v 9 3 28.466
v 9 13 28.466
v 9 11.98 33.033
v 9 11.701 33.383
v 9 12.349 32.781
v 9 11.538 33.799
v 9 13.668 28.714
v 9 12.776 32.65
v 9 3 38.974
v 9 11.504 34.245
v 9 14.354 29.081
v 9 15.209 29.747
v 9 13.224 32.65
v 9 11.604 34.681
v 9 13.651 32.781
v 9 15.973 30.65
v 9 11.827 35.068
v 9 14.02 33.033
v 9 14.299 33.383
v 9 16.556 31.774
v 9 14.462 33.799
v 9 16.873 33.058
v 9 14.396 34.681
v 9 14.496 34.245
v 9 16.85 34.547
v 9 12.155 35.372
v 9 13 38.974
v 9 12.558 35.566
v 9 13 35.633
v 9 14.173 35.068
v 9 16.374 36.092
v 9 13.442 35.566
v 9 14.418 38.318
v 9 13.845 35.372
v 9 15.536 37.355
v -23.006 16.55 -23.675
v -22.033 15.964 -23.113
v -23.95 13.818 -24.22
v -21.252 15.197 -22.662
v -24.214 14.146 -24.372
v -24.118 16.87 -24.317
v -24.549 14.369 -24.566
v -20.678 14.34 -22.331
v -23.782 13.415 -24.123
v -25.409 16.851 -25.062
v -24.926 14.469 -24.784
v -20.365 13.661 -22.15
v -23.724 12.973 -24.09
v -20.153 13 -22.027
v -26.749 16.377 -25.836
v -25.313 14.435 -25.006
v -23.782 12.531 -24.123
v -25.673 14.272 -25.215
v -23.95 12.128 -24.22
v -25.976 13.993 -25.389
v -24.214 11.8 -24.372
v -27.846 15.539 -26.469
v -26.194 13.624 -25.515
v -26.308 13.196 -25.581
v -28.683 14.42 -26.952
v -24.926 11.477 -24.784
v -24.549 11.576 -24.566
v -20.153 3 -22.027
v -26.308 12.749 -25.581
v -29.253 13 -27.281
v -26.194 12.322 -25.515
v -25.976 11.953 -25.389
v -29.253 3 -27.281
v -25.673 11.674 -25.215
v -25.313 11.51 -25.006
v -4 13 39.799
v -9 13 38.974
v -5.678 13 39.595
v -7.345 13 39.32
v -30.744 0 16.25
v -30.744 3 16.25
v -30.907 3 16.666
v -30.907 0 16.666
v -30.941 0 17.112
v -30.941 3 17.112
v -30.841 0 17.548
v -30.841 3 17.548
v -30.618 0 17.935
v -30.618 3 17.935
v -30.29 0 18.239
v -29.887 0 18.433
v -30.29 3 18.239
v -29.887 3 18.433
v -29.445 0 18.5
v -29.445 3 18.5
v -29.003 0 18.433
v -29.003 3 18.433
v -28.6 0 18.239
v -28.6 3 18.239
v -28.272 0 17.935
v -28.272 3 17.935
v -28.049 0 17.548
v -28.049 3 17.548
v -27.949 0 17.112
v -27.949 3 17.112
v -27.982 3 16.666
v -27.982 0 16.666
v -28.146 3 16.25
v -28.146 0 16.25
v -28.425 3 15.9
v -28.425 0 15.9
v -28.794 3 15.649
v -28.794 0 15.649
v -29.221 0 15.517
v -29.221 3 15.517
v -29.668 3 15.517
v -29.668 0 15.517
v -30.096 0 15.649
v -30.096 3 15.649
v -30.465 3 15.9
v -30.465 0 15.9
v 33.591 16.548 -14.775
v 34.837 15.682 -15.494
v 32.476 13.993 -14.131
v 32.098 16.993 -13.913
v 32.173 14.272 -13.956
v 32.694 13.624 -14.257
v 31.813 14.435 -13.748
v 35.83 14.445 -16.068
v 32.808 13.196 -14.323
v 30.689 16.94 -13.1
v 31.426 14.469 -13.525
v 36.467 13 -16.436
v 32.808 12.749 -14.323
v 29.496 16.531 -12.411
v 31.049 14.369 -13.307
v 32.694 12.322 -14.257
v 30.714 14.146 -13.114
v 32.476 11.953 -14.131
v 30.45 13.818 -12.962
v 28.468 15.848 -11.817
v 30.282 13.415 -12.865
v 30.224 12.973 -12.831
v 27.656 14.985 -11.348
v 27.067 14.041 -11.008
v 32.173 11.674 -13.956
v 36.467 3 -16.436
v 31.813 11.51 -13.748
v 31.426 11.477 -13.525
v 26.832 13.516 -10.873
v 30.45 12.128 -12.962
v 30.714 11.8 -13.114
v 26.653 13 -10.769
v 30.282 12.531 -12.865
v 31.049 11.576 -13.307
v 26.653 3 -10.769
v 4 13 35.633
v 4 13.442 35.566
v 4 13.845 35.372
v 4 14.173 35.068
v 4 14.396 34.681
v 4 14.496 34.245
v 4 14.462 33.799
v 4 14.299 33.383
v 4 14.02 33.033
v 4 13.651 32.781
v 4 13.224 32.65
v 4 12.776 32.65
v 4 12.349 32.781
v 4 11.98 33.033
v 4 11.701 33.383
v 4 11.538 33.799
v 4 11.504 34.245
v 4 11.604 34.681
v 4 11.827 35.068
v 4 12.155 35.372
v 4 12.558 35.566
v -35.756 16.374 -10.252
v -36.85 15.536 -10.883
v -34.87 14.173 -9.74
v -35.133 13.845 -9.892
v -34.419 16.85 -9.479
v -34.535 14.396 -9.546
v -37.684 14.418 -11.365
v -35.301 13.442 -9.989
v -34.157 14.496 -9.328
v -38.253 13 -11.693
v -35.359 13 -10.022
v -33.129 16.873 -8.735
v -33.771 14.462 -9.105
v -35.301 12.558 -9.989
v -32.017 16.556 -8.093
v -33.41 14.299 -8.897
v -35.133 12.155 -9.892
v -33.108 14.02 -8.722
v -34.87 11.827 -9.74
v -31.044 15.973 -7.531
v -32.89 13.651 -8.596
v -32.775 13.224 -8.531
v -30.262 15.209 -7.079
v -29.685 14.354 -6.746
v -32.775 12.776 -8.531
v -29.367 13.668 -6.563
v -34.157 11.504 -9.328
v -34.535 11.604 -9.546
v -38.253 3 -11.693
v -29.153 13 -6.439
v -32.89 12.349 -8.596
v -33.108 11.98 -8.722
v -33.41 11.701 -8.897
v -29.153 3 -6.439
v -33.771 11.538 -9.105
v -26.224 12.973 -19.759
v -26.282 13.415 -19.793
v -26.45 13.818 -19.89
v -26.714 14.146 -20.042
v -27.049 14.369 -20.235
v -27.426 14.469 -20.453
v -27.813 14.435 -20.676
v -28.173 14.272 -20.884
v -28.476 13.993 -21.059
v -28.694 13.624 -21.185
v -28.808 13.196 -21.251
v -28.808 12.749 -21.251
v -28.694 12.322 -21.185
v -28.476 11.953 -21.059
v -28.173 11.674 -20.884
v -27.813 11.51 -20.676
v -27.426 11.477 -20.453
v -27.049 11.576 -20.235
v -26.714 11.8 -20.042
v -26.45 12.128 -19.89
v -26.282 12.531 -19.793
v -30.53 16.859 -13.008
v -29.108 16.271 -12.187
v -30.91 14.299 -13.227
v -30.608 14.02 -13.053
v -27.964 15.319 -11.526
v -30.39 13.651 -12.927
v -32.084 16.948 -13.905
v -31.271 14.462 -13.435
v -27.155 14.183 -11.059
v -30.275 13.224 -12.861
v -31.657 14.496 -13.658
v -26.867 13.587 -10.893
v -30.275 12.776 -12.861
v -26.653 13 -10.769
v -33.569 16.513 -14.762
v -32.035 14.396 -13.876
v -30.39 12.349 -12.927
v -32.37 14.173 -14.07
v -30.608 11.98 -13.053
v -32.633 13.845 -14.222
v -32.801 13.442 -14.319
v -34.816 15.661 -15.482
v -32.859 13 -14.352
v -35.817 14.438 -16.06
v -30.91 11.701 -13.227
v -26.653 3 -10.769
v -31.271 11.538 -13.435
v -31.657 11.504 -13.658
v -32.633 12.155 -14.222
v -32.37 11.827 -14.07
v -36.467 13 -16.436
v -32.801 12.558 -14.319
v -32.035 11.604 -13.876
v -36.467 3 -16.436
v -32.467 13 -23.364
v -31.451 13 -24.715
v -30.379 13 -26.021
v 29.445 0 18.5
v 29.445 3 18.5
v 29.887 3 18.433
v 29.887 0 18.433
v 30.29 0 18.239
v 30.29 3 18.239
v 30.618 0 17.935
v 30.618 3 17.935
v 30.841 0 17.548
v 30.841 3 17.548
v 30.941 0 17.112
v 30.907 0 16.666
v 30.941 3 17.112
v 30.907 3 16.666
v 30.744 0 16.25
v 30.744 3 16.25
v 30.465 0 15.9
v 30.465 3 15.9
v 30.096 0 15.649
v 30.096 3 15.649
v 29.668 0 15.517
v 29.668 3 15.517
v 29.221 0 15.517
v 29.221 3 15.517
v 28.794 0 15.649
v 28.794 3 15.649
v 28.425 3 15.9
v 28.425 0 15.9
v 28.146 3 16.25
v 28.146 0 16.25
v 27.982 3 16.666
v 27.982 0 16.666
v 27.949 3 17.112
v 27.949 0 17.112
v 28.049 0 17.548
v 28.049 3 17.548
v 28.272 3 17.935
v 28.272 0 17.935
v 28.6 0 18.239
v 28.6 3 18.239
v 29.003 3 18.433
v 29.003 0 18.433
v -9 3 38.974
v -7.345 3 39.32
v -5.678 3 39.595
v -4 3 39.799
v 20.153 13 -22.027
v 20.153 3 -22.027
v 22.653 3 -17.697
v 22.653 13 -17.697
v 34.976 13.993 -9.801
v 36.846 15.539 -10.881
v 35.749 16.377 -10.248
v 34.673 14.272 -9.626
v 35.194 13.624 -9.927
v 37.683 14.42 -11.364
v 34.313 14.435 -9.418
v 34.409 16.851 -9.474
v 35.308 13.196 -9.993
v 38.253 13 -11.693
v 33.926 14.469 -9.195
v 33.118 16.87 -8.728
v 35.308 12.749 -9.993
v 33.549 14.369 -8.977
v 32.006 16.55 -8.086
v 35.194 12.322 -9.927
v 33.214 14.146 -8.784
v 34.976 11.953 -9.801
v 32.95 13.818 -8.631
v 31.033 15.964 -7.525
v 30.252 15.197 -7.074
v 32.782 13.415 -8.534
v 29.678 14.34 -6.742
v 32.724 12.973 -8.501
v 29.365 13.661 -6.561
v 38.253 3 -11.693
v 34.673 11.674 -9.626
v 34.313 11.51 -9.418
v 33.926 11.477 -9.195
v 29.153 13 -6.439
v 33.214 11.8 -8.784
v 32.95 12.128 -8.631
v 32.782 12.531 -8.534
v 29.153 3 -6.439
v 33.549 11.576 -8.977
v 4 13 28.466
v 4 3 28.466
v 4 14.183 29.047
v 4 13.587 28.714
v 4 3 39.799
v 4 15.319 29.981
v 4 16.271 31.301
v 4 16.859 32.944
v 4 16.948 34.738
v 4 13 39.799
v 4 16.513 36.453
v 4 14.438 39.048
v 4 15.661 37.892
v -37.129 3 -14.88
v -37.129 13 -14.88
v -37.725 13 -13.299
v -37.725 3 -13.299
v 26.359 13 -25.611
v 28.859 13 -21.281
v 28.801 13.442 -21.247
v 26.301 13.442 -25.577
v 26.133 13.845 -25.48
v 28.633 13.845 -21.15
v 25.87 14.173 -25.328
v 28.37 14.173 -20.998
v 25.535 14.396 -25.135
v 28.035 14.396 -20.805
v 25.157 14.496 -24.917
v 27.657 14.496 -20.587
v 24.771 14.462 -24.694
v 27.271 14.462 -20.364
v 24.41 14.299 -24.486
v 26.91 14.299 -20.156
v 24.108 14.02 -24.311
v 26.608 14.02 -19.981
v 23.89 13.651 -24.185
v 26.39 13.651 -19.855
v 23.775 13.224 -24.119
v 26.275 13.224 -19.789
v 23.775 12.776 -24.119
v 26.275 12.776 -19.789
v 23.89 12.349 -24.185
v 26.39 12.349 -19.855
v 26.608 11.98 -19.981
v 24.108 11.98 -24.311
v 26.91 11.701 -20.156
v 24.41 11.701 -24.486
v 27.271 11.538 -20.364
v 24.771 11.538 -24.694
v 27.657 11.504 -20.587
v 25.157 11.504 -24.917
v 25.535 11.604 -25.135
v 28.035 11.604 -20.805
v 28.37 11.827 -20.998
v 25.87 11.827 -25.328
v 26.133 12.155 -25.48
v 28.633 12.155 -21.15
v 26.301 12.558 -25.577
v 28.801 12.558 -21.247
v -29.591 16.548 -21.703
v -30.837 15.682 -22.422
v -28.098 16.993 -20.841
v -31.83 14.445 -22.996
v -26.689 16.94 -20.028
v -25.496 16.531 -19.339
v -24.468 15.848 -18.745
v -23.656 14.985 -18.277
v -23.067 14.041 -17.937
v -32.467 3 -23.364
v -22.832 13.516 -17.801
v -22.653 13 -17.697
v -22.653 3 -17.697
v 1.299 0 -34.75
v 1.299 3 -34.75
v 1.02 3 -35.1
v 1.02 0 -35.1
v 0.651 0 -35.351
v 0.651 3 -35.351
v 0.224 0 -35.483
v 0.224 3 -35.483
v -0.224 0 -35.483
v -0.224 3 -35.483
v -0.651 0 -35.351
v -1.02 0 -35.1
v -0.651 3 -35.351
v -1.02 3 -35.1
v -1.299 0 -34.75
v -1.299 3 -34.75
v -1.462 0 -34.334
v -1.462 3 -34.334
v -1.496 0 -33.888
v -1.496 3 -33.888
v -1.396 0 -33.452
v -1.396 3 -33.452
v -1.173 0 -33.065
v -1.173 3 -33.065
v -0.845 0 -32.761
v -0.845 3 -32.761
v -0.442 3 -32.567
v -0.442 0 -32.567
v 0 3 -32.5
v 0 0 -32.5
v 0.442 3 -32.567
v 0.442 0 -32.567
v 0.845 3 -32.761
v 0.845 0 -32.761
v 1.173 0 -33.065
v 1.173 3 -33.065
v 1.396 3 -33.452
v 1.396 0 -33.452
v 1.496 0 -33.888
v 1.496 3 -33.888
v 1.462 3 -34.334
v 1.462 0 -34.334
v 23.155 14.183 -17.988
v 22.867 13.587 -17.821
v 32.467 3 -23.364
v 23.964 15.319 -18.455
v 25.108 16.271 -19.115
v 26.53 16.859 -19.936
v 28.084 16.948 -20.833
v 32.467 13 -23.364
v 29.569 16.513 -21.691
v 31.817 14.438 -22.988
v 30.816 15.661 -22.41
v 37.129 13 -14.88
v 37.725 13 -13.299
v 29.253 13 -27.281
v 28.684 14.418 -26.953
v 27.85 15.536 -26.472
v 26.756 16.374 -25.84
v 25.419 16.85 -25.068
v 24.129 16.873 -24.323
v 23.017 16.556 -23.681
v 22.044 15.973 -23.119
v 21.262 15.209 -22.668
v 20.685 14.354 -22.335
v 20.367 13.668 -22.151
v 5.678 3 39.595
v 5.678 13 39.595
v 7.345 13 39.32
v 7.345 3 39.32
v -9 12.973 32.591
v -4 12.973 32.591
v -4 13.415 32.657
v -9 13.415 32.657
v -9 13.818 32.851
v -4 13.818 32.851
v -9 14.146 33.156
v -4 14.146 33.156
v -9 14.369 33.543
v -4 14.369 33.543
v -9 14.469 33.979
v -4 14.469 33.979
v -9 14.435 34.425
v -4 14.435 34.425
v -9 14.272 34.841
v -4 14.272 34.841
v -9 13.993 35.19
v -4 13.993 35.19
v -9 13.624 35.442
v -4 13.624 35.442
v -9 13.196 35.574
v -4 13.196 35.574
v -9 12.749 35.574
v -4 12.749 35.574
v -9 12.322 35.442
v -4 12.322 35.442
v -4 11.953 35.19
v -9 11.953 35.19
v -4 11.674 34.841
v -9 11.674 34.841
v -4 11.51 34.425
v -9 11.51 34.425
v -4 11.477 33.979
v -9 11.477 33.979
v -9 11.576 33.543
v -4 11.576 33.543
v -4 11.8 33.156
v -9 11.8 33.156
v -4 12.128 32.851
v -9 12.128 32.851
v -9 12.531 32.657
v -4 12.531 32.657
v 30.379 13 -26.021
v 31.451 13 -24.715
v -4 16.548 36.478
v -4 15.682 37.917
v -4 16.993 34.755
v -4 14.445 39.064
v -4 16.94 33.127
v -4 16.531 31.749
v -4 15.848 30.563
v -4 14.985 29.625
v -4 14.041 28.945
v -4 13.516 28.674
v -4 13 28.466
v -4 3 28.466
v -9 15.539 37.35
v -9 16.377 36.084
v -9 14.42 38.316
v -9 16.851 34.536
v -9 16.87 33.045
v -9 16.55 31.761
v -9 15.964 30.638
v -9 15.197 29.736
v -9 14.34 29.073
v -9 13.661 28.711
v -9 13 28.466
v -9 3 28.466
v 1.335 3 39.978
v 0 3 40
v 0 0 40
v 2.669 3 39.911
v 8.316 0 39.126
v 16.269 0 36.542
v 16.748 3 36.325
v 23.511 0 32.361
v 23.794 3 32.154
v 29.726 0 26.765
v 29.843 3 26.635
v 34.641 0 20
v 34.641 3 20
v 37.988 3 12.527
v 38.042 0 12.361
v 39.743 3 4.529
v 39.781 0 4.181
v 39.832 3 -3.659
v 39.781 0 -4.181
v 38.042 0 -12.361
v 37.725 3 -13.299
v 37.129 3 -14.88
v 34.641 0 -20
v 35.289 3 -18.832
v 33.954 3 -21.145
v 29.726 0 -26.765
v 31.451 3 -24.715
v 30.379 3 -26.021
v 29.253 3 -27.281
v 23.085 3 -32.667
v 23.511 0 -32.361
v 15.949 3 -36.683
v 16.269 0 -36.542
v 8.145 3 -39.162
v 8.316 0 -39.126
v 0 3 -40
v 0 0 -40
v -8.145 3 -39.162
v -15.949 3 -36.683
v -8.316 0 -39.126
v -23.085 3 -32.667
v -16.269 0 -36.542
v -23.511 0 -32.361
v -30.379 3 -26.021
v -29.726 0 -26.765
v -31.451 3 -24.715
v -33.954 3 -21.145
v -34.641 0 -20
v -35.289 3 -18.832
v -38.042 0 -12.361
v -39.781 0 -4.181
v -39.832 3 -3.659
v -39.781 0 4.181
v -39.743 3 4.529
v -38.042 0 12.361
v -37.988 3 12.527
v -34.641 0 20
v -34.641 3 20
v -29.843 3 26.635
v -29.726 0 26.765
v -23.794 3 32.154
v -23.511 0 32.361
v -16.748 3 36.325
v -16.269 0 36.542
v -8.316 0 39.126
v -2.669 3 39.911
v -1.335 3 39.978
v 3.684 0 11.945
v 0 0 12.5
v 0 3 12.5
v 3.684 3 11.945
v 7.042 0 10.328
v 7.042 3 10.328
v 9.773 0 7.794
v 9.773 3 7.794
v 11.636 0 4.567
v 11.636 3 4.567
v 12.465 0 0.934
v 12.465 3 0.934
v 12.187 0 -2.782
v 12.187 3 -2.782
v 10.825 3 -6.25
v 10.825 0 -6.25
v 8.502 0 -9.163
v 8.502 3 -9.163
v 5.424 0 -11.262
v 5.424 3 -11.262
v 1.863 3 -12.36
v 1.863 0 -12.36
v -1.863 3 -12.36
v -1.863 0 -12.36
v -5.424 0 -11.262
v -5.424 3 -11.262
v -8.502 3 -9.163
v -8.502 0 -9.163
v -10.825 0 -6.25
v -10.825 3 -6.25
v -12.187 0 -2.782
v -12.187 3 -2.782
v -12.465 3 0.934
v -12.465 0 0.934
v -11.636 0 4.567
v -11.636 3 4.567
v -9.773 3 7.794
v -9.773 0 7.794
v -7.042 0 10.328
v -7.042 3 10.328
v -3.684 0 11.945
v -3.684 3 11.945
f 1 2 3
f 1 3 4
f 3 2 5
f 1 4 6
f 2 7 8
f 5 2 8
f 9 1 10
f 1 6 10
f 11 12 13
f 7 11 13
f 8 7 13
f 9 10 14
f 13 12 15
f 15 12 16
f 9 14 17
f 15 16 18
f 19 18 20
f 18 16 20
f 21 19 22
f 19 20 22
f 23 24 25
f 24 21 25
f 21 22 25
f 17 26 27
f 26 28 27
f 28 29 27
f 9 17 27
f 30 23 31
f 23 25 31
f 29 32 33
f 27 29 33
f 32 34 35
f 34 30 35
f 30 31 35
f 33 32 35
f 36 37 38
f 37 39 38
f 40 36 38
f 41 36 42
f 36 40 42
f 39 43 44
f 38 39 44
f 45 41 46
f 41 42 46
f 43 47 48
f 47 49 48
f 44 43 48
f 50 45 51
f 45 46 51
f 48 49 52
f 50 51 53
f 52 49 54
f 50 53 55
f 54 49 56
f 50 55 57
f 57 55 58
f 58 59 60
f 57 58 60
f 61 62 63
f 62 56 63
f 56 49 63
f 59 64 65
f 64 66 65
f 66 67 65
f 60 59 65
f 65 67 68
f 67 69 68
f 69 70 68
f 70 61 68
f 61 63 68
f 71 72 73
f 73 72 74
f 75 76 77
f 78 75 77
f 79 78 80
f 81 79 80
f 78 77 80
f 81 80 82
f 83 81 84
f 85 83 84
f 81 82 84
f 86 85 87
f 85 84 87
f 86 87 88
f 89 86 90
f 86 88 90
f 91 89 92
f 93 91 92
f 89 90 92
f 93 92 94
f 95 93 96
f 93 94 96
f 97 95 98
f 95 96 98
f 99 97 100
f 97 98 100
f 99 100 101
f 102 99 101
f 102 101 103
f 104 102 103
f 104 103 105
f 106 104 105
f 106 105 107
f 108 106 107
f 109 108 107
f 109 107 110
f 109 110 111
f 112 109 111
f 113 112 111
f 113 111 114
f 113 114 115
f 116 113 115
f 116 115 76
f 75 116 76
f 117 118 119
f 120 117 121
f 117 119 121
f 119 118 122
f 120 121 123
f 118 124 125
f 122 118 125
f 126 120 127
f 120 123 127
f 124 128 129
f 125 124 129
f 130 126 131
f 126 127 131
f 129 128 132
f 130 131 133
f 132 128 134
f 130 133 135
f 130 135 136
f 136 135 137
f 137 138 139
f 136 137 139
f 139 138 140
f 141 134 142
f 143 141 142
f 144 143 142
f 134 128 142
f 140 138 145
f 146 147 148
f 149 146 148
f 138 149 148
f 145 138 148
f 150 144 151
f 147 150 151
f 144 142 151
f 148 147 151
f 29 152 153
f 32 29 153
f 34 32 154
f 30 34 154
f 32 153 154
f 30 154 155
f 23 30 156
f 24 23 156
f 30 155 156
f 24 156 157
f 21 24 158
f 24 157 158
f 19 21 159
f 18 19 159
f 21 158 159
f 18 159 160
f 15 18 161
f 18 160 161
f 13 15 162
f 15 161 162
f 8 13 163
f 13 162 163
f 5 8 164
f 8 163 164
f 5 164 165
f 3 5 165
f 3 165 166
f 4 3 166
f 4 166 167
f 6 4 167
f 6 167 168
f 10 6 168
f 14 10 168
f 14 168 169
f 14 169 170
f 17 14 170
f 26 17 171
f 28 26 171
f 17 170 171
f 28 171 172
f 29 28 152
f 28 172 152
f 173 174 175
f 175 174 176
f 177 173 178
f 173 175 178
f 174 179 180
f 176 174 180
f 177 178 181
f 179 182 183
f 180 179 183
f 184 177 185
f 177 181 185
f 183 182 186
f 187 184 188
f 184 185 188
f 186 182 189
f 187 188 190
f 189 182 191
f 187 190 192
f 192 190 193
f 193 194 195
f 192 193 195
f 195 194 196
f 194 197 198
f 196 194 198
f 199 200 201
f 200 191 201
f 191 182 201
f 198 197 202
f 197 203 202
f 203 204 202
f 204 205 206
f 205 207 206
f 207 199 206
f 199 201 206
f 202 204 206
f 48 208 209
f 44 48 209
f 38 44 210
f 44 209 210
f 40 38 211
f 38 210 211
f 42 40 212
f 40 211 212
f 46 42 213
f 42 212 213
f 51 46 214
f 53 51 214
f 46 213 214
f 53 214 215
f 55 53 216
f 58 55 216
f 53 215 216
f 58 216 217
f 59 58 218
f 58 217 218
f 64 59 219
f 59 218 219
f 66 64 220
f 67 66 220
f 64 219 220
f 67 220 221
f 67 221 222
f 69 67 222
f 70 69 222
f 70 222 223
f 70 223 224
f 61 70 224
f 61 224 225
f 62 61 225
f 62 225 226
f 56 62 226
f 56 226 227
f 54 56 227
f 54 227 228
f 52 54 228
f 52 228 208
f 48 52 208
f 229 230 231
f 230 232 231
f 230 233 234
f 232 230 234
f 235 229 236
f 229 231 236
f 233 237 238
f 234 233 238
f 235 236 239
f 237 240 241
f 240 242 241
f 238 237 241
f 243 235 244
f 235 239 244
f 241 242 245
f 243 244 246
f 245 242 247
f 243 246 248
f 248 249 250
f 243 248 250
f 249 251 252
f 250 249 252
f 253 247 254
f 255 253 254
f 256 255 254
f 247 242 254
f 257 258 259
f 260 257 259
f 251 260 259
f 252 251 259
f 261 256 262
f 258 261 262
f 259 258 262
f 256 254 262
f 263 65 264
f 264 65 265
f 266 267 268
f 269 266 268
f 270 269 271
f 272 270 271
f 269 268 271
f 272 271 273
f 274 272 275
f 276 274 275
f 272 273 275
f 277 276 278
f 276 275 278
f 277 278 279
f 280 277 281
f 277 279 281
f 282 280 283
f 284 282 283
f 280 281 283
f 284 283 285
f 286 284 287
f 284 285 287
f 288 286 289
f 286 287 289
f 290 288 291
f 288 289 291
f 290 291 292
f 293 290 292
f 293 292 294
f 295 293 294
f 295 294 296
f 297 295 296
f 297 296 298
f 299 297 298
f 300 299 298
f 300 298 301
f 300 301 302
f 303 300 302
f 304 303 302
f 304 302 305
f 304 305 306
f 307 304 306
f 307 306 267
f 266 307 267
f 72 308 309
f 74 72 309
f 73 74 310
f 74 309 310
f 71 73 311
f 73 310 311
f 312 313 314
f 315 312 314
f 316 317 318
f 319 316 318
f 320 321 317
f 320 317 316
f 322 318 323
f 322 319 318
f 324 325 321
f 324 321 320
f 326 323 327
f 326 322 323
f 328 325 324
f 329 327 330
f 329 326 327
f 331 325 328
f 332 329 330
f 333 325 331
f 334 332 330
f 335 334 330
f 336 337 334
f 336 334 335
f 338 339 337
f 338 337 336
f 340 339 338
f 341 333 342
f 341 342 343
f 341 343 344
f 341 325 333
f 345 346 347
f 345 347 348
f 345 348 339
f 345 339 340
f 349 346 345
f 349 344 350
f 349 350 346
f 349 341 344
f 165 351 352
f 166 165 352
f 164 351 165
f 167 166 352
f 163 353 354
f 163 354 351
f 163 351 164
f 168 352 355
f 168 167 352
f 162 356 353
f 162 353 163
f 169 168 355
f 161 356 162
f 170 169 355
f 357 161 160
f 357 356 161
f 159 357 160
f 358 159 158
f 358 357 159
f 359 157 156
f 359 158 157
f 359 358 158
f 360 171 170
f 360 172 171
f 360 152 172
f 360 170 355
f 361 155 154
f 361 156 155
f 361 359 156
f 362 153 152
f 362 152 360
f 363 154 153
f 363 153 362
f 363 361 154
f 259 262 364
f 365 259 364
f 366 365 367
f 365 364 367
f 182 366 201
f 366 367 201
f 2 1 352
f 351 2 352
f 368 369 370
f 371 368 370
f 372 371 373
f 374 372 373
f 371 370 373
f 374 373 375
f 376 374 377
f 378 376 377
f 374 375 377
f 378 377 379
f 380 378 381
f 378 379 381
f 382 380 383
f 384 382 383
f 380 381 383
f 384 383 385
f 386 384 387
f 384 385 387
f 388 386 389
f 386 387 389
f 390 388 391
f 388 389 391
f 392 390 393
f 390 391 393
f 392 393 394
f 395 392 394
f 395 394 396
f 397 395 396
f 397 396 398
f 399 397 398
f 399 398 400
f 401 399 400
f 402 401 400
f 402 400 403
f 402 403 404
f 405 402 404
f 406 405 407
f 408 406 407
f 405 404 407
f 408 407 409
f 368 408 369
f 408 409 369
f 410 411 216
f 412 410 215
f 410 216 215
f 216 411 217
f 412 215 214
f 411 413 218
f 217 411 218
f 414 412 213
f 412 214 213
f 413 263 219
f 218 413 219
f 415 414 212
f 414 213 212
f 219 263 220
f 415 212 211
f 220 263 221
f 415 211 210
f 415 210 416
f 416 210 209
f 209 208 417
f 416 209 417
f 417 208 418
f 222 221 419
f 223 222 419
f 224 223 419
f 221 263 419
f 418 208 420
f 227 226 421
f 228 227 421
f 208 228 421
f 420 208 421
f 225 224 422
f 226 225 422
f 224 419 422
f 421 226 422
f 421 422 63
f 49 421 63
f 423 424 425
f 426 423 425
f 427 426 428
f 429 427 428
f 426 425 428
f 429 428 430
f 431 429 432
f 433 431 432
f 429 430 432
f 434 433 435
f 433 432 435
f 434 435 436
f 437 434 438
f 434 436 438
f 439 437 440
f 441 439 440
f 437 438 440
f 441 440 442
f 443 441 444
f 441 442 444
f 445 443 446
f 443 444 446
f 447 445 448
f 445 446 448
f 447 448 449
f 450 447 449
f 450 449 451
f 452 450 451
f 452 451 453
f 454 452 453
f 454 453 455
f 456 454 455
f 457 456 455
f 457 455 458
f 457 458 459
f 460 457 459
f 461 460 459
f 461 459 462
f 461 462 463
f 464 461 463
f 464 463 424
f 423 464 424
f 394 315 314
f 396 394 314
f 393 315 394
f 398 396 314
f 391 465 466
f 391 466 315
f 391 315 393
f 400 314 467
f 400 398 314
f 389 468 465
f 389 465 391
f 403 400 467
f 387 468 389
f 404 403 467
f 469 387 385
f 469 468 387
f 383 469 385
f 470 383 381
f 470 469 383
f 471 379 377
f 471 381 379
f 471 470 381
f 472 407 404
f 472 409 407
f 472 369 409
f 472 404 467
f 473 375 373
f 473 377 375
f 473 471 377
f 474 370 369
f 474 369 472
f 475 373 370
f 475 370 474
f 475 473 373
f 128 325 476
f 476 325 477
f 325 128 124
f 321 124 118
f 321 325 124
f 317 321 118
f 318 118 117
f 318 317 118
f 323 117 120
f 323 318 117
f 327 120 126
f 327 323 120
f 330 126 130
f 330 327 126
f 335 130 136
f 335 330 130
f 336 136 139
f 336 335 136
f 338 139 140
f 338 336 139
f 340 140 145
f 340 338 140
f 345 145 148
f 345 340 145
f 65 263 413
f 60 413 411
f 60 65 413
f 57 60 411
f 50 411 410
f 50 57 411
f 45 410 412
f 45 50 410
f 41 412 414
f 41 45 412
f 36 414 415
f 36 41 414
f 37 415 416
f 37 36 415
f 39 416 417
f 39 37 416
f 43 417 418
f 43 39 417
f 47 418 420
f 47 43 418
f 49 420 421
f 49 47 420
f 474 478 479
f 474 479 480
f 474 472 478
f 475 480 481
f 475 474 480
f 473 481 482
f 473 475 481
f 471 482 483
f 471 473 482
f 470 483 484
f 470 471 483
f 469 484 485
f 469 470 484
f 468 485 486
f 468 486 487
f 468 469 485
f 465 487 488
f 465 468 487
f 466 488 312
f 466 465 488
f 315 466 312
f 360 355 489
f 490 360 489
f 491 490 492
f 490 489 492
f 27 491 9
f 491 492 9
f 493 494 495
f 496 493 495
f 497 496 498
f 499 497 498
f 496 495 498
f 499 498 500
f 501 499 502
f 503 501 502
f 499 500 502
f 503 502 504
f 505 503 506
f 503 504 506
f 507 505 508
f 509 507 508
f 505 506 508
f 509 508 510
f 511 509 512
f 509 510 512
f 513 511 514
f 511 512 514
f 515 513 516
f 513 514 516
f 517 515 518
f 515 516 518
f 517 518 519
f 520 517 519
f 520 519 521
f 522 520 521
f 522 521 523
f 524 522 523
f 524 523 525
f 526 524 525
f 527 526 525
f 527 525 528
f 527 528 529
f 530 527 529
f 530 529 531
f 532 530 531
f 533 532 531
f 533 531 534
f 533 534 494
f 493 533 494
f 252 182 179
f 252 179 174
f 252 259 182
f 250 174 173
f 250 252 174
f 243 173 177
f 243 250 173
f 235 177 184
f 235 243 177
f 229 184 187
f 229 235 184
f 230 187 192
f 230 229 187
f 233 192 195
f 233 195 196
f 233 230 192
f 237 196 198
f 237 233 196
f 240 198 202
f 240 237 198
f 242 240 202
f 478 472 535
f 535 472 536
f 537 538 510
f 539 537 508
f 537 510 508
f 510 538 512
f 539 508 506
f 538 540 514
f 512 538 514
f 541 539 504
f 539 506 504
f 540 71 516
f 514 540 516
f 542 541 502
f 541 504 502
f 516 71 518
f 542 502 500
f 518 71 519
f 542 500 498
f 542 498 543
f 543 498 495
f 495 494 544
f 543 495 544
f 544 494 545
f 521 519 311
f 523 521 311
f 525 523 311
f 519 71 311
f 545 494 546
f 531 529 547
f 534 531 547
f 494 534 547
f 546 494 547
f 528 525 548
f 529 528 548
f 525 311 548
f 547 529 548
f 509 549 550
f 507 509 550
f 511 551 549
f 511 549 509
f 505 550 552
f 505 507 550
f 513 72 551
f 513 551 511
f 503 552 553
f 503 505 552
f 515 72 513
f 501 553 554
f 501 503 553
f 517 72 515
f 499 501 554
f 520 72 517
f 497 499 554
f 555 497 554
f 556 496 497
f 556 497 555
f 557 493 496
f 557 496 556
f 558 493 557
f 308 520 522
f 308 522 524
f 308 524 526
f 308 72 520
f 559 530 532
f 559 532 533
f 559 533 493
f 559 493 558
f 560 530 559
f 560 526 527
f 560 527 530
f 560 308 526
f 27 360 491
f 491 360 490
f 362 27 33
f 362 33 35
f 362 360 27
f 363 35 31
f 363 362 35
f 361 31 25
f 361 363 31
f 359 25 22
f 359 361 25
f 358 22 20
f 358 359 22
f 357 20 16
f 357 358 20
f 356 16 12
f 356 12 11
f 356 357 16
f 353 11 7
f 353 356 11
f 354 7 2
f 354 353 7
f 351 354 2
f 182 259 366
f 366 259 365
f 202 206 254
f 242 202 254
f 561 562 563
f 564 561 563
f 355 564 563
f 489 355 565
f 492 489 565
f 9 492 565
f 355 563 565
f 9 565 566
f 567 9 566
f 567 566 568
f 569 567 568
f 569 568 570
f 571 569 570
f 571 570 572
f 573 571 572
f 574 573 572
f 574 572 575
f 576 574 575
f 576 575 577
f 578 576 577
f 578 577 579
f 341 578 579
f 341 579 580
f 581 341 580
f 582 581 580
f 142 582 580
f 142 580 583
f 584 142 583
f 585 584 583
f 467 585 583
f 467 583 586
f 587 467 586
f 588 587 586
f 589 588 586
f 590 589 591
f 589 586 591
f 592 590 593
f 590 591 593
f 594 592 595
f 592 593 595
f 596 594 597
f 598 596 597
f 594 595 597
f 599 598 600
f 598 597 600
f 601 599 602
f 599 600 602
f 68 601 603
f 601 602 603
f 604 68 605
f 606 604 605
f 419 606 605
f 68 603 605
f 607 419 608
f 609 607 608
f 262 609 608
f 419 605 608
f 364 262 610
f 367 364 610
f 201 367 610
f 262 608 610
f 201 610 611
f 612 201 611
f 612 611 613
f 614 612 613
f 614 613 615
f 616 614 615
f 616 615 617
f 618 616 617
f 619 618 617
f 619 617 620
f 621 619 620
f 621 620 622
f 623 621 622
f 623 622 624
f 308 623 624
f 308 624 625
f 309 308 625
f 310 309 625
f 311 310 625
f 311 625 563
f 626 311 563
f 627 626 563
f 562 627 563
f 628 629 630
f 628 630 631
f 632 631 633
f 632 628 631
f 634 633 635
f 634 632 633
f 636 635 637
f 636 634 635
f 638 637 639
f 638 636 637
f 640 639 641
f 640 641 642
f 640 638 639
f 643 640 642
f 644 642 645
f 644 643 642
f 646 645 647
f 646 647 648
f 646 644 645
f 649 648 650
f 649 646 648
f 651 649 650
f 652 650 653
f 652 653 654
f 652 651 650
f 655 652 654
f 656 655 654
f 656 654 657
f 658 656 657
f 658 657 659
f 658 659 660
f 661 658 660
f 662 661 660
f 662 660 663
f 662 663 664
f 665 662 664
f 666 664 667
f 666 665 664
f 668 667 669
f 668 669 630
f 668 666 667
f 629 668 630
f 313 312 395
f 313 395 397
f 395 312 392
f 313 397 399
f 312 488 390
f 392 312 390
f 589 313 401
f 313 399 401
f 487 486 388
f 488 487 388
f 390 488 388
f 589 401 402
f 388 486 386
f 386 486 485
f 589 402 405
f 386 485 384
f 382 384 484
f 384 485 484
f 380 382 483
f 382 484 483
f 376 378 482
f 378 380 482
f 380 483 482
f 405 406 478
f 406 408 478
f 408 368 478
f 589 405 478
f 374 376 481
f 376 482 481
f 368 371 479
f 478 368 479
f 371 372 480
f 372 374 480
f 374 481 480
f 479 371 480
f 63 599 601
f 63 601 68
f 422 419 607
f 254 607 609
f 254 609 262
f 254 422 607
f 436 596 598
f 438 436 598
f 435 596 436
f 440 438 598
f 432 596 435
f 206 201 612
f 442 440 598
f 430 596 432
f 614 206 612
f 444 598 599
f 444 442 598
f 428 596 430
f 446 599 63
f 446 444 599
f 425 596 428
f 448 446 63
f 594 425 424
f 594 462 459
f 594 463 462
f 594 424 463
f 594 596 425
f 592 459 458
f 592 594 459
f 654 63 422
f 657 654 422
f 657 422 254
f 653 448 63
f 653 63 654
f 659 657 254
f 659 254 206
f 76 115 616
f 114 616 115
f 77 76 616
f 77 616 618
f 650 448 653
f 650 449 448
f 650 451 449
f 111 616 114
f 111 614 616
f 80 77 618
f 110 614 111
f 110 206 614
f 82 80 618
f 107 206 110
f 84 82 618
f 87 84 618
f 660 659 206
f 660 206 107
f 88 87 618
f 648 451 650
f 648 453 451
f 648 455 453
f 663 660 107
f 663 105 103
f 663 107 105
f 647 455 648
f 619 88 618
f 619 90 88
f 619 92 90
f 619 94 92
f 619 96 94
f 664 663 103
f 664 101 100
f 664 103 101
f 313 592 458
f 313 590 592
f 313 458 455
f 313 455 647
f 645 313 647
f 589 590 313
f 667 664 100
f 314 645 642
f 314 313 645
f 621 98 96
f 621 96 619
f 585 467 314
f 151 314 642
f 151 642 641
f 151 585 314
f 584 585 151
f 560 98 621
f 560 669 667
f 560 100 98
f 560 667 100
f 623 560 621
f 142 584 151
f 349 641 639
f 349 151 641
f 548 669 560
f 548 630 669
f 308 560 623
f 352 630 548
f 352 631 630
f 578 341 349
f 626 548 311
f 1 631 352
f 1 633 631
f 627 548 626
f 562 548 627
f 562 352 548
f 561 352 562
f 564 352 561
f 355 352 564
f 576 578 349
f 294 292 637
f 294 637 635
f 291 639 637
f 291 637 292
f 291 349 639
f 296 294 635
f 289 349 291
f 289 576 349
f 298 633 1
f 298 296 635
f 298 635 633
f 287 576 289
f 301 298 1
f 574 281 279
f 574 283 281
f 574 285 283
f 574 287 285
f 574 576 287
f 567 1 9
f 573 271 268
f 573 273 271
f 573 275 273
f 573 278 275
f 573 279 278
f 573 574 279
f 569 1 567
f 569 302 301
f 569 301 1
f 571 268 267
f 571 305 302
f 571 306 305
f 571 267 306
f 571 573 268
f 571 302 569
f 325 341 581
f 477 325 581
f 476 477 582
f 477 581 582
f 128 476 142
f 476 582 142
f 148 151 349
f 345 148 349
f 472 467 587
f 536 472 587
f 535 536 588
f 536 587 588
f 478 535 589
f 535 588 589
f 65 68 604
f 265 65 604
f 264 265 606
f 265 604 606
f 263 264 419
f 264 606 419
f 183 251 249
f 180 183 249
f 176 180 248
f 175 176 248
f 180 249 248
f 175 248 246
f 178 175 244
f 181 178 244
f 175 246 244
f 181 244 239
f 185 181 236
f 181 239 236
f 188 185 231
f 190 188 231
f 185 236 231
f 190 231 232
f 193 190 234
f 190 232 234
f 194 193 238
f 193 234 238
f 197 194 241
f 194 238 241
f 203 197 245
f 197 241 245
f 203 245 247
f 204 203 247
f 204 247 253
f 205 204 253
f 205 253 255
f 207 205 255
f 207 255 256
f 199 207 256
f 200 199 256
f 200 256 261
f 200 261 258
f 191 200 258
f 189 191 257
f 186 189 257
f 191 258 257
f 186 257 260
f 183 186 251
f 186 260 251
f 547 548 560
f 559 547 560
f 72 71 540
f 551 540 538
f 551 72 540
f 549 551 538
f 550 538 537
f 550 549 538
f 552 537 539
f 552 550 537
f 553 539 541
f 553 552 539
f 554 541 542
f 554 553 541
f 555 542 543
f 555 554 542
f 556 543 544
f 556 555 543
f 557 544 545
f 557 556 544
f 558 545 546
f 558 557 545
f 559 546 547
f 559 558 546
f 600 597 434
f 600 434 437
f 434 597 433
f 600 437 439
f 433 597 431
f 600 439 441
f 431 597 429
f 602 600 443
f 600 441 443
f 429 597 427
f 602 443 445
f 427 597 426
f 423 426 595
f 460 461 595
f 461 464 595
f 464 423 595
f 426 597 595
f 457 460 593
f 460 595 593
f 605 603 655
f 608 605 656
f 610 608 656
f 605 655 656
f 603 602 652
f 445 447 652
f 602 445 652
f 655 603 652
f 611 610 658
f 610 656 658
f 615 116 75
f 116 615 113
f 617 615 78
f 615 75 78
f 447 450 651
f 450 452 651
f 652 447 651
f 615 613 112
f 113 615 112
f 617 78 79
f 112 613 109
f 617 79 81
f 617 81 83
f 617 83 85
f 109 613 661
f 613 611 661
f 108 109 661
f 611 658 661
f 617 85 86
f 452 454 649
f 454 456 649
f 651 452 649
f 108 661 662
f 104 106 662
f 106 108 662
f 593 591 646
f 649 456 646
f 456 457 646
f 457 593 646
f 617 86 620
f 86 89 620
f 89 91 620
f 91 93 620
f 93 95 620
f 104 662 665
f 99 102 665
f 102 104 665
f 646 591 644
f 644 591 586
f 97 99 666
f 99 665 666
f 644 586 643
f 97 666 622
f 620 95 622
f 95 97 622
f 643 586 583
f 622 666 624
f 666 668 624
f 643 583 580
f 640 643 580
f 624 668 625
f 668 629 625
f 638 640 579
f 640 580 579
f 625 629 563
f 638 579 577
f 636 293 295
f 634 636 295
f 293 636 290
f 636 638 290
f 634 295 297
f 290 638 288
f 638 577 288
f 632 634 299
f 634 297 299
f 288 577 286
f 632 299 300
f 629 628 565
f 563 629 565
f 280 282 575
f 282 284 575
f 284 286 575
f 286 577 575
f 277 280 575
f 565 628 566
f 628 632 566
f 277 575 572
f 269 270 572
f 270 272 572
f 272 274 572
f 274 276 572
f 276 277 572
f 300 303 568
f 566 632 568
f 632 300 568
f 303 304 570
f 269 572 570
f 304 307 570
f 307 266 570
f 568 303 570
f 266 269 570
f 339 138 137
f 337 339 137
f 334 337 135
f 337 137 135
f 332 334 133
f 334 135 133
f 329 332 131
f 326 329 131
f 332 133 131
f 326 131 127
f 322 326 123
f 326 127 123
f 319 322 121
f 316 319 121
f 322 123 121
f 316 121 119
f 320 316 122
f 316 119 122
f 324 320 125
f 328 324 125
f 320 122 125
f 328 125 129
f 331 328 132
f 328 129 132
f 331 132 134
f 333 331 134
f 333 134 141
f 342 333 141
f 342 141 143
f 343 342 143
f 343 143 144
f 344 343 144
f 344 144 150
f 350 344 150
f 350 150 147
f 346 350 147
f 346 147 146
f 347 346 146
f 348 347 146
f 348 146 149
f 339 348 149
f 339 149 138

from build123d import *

# Parameters (mm, degrees)
SKETCH1_R           = 40
SKETCH1_R_2         = 12.5
BOSS_EXTRUDE1_DEPTH = 3
BOSS_EXTRUDE5_DEPTH = 10
SKETCH20_R          = 1.5
CUT_EXTRUDE3_DEPTH  = 5
SKETCH22_R          = 1.5
CUT_EXTRUDE4_DEPTH  = 10
CIRPATTERN1_COUNT   = 3
SKETCH24_R          = 1.5
CUT_EXTRUDE5_DEPTH  = 10
CIRPATTERN2_COUNT   = 3


with BuildPart() as part:
    # Sketch1 → Boss-Extrude1 (new body)
    with BuildSketch(Plane(origin=(0, 0, 0), x_dir=(1, 0, 0), z_dir=(0, 1, 0))):
        with Locations(Location((0, 0, 0), (0, 0, 270))):
            Circle(SKETCH1_R)
        with Locations(Location((0, 0, 0), (0, 0, 270))):
            Circle(SKETCH1_R_2, mode=Mode.SUBTRACT)
    extrude(amount=BOSS_EXTRUDE1_DEPTH)

    # Sketch8 → Boss-Extrude5 (add)
    with BuildSketch(Plane(origin=(0, 3, 0), x_dir=(1, 0, 0), z_dir=(0, 1, 0))):
        with BuildLine():
            Line((-4, -39.799497484), (-4, -28.466262232))
            Line((-4, -28.466262232), (-9, -28.466262232))
            Line((-9, -28.466262232), (-9, -38.97435054))
            ThreePointArc((-9, -38.97435054), (-6.513080444, -39.466185313), (-4, -39.799497484))
        make_face()
        with BuildLine():
            Line((4, -28.466262232), (4, -39.799497484))
            ThreePointArc((4, -39.799497484), (6.513080444, -39.466185313), (9, -38.97435054))
            Line((9, -38.97435054), (9, -28.466262232))
            Line((9, -28.466262232), (4, -28.466262232))
        make_face()
    boss_extrude5 = extrude(amount=BOSS_EXTRUDE5_DEPTH)

    # Sketch9 for Loft4 → Loft4 section 0
    with BuildSketch(Plane(origin=(9, 0, 0), x_dir=(0, 0, -1), z_dir=(1, 0, 0))):
        with BuildLine():
            Line((-28.466262232, 13), (-38.97435054, 13))
            # circular arc as an exact rational Bezier (weights 1, cos(half-angle), 1)
            Bezier((-38.97435054, 13), (-33.720306386, 30.574863042), (-28.466262232, 13), weights=[1, 0.286426753, 1])
        make_face()
    # Sketch10 for Loft4 → Loft4 section 1
    with BuildSketch(Plane.ZY.offset(-4)):
        with BuildLine():
            Line((28.466262232, 13), (39.799497484, 13))
            Bezier((39.799497484, 13), (34.132879858, 28.686313092), (28.466262232, 13), weights=[1, 0.339756679, 1])
        make_face()
    loft4 = loft()

    # Loft7: read off the stored shape, not the designer's step
    # Loft7: loft between two sections, ruled curve by curve
    loft7_from = [
        Edge.make_bspline([(-4, 13, 39.799497484), (-4, 13.445887075, 39.644015382), (-4, 13.912406496, 39.42235746), (-4, 14.83103025, 38.804929607), (-4, 15.282819738, 38.407898984), (-4, 16.078747391, 37.428773866), (-4, 16.421172618, 36.845868146), (-4, 16.895486355, 35.552548175), (-4, 17.025283738, 34.843378132), (-4, 17.025283738, 33.422381584), (-4, 16.895486355, 32.713211541), (-4, 16.421172618, 31.419891571), (-4, 16.078747391, 30.83698585), (-4, 15.282819738, 29.857860733), (-4, 14.83103025, 29.460830109), (-4, 13.912406496, 28.843402256), (-4, 13.445887075, 28.621744334), (-4, 13, 28.466262232)], [0, 0, 0, 0, 0.125, 0.125, 0.25, 0.25, 0.375, 0.375, 0.5, 0.5, 0.625, 0.625, 0.75, 0.75, 0.875, 0.875, 1, 1, 1, 1], 3),
        Edge.make_line((-4, 13, 28.466262232), (-4, 13, 39.799497484)),
    ]
    loft7_to = [
        Edge.make_bspline([(-9, 13, 38.97435054), (-9, 13.419469841, 38.848866269), (-9, 13.863009903, 38.66161005), (-9, 14.746425178, 38.117380283), (-9, 15.186117881, 37.75901052), (-9, 15.967952584, 36.854602056), (-9, 16.308267994, 36.307496065), (-9, 16.781693902, 35.08000068), (-9, 16.912355403, 34.400917098), (-9, 16.912355403, 33.039695674), (-9, 16.781693902, 32.360612092), (-9, 16.308267994, 31.133116706), (-9, 15.967952584, 30.586010716), (-9, 15.186117881, 29.681602252), (-9, 14.746425178, 29.323232488), (-9, 13.863009903, 28.779002722), (-9, 13.419469841, 28.591746503), (-9, 13, 28.466262232)], [0, 0, 0, 0, 0.125, 0.125, 0.25, 0.25, 0.375, 0.375, 0.5, 0.5, 0.625, 0.625, 0.75, 0.75, 0.875, 0.875, 1, 1, 1, 1], 3),
        Edge.make_line((-9, 13, 28.466262232), (-9, 13, 38.97435054)),
    ]
    loft7 = Solid(Shell([*[Face.make_surface_from_curves(loft7_from[k], loft7_to[k]) for k in range(2)], Face(Wire(loft7_from)), Face(Wire(loft7_to))]))
    add(loft7)

    # Sketch20 → Cut-Extrude3 (cut)
    with BuildSketch(Plane.ZY.offset(-4)):
        with Locations((34.132879858, 13)):
            Circle(SKETCH20_R)
    cut_extrude3 = extrude(amount=-CUT_EXTRUDE3_DEPTH, mode=Mode.SUBTRACT)

    # Sketch22 → Cut-Extrude4 (cut)
    with BuildSketch(Plane(origin=(-4, 0, 0), x_dir=(0, 0, -1), z_dir=(1, 0, 0))):
        with Locations((-34.090737301, 12.972785767)):
            Circle(SKETCH22_R)
    cut_extrude4 = extrude(amount=-CUT_EXTRUDE4_DEPTH, mode=Mode.SUBTRACT)

    # CirPattern1: Boss-Extrude5, Loft4, Loft7, Cut-Extrude3, Cut-Extrude4 ×3 about axis
    cirpattern1_axis = Axis((0, 0, 0), (0, 1, 0))
    add([boss_extrude5.rotate(cirpattern1_axis, i * 360 / CIRPATTERN1_COUNT) for i in range(1, CIRPATTERN1_COUNT)])
    add([loft4.rotate(cirpattern1_axis, i * 360 / CIRPATTERN1_COUNT) for i in range(1, CIRPATTERN1_COUNT)])
    add([loft7.rotate(cirpattern1_axis, i * 360 / CIRPATTERN1_COUNT) for i in range(1, CIRPATTERN1_COUNT)])
    add([cut_extrude3.rotate(cirpattern1_axis, i * 360 / CIRPATTERN1_COUNT) for i in range(1, CIRPATTERN1_COUNT)], mode=Mode.SUBTRACT)
    add([cut_extrude4.rotate(cirpattern1_axis, i * 360 / CIRPATTERN1_COUNT) for i in range(1, CIRPATTERN1_COUNT)], mode=Mode.SUBTRACT)

    # Sketch24 → Cut-Extrude5 (cut)
    with BuildSketch(Plane(origin=(0, 3, 0), x_dir=(1, 0, 0), z_dir=(0, 1, 0))):
        with Locations(Location((29.444863729, -17, 0), (0, 0, 270))):
            Circle(SKETCH24_R)
    cut_extrude5 = extrude(amount=-CUT_EXTRUDE5_DEPTH, mode=Mode.SUBTRACT)

    # CirPattern2: Cut-Extrude5 ×3 about axis
    cirpattern2_axis = Axis((0, 0, 0), (0, 1, 0))
    for i in range(1, CIRPATTERN2_COUNT):
        add(cut_extrude5.rotate(cirpattern2_axis, i * 360 / CIRPATTERN2_COUNT), mode=Mode.SUBTRACT)


solid = part.part
